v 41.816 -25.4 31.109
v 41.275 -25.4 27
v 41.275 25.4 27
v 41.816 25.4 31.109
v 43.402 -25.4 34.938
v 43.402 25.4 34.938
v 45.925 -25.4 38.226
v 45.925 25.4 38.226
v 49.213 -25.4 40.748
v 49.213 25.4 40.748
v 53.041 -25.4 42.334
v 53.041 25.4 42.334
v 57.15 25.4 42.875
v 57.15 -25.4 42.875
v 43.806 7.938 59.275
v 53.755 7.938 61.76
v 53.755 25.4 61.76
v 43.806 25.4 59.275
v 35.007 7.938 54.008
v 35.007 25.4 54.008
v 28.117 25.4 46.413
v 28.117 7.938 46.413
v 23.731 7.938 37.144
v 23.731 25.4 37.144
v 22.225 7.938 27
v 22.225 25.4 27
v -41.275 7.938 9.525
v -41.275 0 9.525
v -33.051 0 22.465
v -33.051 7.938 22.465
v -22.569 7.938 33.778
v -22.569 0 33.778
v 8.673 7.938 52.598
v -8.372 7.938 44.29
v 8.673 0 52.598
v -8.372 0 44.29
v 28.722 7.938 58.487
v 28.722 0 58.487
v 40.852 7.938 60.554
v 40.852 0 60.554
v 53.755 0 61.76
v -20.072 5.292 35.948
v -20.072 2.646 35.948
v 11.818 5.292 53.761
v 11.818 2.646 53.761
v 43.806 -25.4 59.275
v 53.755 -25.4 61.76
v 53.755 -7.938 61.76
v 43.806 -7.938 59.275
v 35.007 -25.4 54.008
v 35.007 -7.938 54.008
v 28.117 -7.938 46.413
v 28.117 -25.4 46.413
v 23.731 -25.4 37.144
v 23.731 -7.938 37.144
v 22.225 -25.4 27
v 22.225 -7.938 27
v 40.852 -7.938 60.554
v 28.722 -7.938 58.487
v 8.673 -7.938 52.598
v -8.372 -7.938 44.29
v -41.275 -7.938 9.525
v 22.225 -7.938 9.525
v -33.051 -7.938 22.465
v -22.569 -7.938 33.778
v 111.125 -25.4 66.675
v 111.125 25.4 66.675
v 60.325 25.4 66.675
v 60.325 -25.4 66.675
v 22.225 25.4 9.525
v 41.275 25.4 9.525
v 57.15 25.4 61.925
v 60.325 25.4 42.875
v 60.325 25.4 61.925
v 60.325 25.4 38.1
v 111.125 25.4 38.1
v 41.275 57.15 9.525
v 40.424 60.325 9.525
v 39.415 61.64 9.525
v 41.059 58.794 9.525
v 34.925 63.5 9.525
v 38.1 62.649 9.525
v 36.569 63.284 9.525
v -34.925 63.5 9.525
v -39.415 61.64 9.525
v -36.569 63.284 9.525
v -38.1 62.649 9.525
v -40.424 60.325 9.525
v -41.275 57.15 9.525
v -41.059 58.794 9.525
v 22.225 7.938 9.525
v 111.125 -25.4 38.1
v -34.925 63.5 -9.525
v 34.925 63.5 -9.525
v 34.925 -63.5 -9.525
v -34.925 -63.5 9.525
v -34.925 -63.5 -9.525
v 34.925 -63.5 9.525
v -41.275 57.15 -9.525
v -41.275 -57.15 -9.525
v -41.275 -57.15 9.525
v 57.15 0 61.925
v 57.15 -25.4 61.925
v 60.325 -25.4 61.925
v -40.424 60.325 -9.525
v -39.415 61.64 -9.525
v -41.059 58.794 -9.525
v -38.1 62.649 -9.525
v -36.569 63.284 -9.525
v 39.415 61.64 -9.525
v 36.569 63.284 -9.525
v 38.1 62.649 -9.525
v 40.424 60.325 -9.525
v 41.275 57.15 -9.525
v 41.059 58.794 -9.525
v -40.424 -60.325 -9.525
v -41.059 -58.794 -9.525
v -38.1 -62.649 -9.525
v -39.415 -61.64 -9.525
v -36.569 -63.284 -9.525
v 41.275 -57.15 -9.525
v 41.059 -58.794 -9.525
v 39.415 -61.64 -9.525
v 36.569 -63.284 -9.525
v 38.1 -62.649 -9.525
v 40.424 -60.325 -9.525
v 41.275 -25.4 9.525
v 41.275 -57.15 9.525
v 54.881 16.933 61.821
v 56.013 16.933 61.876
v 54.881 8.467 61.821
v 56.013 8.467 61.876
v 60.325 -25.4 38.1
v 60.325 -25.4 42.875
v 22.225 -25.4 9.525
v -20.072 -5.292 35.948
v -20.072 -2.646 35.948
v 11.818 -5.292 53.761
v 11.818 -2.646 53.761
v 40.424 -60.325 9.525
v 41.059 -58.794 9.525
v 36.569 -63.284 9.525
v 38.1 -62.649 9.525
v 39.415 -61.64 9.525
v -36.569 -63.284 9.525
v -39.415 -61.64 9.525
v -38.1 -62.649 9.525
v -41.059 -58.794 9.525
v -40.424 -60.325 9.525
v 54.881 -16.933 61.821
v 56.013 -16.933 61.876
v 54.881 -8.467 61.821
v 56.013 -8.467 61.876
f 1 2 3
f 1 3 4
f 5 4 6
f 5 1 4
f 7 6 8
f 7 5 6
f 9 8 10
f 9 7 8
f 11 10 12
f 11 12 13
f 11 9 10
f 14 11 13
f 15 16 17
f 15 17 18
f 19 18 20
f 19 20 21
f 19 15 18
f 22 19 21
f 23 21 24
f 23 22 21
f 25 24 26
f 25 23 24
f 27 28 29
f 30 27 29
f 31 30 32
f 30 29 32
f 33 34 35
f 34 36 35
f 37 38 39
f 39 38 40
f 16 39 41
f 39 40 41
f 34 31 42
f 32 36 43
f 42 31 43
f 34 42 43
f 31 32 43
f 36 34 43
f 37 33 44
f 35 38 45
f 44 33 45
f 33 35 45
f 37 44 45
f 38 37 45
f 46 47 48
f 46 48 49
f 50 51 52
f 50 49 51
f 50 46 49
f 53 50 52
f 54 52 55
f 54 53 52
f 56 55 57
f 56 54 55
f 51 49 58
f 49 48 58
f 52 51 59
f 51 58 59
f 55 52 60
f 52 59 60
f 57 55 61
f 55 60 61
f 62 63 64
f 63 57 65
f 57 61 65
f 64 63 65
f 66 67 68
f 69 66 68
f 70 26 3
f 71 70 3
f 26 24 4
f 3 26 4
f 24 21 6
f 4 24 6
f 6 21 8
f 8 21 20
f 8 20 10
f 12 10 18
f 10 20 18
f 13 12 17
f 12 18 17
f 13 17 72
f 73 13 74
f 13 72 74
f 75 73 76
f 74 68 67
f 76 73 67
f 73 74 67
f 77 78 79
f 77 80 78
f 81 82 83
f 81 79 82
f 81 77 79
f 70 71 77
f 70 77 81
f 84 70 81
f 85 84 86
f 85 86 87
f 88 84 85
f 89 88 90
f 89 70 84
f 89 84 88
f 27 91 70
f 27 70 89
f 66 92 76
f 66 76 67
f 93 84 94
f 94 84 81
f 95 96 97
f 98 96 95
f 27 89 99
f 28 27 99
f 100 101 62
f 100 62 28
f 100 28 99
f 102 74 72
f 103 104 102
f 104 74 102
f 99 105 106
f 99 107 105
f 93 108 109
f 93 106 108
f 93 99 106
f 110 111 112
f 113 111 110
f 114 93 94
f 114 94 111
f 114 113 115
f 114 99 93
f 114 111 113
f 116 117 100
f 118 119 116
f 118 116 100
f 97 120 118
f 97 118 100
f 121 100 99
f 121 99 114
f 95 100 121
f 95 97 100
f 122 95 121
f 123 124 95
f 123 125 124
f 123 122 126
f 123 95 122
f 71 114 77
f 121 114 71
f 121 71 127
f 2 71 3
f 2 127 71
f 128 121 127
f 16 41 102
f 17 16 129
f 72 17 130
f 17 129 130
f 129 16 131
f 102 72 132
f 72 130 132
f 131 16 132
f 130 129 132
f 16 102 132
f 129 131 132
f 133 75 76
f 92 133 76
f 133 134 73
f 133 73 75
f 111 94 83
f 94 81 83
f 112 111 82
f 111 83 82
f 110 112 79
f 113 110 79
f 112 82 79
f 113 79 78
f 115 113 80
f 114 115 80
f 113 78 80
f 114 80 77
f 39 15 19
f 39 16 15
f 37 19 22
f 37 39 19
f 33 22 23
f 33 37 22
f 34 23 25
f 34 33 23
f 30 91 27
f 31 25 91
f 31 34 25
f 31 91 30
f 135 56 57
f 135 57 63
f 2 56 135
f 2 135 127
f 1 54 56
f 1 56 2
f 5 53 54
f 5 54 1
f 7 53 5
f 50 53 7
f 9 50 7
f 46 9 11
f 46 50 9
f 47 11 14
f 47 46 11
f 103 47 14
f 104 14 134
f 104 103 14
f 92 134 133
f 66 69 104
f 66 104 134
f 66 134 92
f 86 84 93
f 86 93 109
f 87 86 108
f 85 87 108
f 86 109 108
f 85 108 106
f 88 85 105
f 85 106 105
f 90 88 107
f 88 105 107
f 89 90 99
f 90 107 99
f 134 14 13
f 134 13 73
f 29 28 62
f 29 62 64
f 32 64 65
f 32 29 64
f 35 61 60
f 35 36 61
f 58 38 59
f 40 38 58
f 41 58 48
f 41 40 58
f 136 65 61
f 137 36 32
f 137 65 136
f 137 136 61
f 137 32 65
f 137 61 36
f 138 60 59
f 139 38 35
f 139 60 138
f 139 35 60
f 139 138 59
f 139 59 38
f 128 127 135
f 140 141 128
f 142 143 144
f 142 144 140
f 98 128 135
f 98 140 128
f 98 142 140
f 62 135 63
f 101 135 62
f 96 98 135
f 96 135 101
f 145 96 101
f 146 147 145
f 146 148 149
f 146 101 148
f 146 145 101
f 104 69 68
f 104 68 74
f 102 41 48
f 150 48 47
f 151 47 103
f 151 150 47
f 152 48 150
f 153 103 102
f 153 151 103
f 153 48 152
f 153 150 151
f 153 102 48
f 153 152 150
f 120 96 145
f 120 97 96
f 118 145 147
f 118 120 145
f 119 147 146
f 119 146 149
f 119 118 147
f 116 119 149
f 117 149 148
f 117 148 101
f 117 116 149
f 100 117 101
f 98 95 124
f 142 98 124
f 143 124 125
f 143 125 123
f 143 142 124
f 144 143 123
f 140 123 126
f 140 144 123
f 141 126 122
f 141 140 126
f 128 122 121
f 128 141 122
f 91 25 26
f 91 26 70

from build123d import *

# Parameters (mm, degrees)
F1_DEPTH = 63.5
F0_W     = 25.4
F0_H     = 28.575
F2_DEPTH = 25.4
F3_DEPTH = 7.9375
F5_R     = 6.35


with BuildPart() as f1:
    # F0 (on Front) → F1 (new body, symmetric)
    with BuildSketch(Plane.XZ):
        Polygon((22.225, 9.525), (-41.275, 9.525), (-41.275, -9.525), (41.275, -9.525), (41.275, 9.525), align=None)
    extrude(amount=F1_DEPTH, both=True)

    # F0 (on Front) → F2 (join, symmetric)
    with BuildSketch(Plane.XZ):
        with BuildLine():
            Line((22.225, 27.0002), (22.225, 9.525))
            Line((22.225, 9.525), (41.275, 9.525))
            Line((41.275, 9.525), (41.275, 27.0002))
            ThreePointArc((41.275, 27.0002), (45.92468, 38.22552), (57.15, 42.8752))
            Line((57.15, 42.8752), (60.325, 42.8752))
            Line((60.325, 42.8752), (60.325, 55.5752))
            Line((60.325, 55.5752), (60.325, 61.9252))
            Line((60.325, 61.9252), (57.15, 61.9252))
            add(Edge.make_bspline(
                [(53.755209, 61.759818), (54.878671, 61.824514), (56.010282, 61.879666), (57.15, 61.9252)],
                knots=[108.887606, 108.887606, 108.887606, 108.887606, 111.504536, 111.504536, 111.504536, 111.504536], degree=3))
            ThreePointArc((53.755209, 61.759818), (31.281885, 50.464988), (22.225, 27.0002))
        make_face()
        Polygon((60.325, 66.675), (60.325, 61.9252), (60.325, 55.5752), (60.325, 42.8752), (60.325, 38.1), (85.725, 38.1), (85.725, 66.675), align=None)
        with Locations((98.425, 52.3875)):
            Rectangle(F0_W, F0_H)
    extrude(amount=F2_DEPTH, both=True)

    # F0 (on Front) → F3 (join, symmetric)
    with BuildSketch(Plane.XZ):
        with BuildLine():
            add(Edge.make_bspline(
                [(-41.275, 9.525), (-25.63058, 39.853167), (7.009152, 59.067885), (53.755209, 61.759818)],
                knots=[0, 0, 0, 0, 108.887606, 108.887606, 108.887606, 108.887606], degree=3))
            Line((-41.275, 9.525), (22.225, 9.525))
            Line((22.225, 9.525), (22.225, 27.0002))
            ThreePointArc((22.225, 27.0002), (31.281885, 50.464988), (53.755209, 61.759818))
        make_face()
    extrude(amount=F3_DEPTH, both=True)

    # F0 (on Front) → F4 (revolve)
    with BuildSketch(Plane.XZ):
        with Locations((98.425, 52.3875)):
            Rectangle(F0_W, F0_H)
    revolve(axis=Axis((85.725, 0, 52.3875), (0, 0, -1)))

    # F5
    f5_edges = [f1.edges().sort_by_distance(p)[0] for p in [
        (41.275, -63.5, 0),
        (41.275, 63.5, 0),
        (-41.275, -63.5, 0),
        (-41.275, 63.5, 0),
    ]]
    fillet(f5_edges, radius=F5_R)


solid = f1.part
